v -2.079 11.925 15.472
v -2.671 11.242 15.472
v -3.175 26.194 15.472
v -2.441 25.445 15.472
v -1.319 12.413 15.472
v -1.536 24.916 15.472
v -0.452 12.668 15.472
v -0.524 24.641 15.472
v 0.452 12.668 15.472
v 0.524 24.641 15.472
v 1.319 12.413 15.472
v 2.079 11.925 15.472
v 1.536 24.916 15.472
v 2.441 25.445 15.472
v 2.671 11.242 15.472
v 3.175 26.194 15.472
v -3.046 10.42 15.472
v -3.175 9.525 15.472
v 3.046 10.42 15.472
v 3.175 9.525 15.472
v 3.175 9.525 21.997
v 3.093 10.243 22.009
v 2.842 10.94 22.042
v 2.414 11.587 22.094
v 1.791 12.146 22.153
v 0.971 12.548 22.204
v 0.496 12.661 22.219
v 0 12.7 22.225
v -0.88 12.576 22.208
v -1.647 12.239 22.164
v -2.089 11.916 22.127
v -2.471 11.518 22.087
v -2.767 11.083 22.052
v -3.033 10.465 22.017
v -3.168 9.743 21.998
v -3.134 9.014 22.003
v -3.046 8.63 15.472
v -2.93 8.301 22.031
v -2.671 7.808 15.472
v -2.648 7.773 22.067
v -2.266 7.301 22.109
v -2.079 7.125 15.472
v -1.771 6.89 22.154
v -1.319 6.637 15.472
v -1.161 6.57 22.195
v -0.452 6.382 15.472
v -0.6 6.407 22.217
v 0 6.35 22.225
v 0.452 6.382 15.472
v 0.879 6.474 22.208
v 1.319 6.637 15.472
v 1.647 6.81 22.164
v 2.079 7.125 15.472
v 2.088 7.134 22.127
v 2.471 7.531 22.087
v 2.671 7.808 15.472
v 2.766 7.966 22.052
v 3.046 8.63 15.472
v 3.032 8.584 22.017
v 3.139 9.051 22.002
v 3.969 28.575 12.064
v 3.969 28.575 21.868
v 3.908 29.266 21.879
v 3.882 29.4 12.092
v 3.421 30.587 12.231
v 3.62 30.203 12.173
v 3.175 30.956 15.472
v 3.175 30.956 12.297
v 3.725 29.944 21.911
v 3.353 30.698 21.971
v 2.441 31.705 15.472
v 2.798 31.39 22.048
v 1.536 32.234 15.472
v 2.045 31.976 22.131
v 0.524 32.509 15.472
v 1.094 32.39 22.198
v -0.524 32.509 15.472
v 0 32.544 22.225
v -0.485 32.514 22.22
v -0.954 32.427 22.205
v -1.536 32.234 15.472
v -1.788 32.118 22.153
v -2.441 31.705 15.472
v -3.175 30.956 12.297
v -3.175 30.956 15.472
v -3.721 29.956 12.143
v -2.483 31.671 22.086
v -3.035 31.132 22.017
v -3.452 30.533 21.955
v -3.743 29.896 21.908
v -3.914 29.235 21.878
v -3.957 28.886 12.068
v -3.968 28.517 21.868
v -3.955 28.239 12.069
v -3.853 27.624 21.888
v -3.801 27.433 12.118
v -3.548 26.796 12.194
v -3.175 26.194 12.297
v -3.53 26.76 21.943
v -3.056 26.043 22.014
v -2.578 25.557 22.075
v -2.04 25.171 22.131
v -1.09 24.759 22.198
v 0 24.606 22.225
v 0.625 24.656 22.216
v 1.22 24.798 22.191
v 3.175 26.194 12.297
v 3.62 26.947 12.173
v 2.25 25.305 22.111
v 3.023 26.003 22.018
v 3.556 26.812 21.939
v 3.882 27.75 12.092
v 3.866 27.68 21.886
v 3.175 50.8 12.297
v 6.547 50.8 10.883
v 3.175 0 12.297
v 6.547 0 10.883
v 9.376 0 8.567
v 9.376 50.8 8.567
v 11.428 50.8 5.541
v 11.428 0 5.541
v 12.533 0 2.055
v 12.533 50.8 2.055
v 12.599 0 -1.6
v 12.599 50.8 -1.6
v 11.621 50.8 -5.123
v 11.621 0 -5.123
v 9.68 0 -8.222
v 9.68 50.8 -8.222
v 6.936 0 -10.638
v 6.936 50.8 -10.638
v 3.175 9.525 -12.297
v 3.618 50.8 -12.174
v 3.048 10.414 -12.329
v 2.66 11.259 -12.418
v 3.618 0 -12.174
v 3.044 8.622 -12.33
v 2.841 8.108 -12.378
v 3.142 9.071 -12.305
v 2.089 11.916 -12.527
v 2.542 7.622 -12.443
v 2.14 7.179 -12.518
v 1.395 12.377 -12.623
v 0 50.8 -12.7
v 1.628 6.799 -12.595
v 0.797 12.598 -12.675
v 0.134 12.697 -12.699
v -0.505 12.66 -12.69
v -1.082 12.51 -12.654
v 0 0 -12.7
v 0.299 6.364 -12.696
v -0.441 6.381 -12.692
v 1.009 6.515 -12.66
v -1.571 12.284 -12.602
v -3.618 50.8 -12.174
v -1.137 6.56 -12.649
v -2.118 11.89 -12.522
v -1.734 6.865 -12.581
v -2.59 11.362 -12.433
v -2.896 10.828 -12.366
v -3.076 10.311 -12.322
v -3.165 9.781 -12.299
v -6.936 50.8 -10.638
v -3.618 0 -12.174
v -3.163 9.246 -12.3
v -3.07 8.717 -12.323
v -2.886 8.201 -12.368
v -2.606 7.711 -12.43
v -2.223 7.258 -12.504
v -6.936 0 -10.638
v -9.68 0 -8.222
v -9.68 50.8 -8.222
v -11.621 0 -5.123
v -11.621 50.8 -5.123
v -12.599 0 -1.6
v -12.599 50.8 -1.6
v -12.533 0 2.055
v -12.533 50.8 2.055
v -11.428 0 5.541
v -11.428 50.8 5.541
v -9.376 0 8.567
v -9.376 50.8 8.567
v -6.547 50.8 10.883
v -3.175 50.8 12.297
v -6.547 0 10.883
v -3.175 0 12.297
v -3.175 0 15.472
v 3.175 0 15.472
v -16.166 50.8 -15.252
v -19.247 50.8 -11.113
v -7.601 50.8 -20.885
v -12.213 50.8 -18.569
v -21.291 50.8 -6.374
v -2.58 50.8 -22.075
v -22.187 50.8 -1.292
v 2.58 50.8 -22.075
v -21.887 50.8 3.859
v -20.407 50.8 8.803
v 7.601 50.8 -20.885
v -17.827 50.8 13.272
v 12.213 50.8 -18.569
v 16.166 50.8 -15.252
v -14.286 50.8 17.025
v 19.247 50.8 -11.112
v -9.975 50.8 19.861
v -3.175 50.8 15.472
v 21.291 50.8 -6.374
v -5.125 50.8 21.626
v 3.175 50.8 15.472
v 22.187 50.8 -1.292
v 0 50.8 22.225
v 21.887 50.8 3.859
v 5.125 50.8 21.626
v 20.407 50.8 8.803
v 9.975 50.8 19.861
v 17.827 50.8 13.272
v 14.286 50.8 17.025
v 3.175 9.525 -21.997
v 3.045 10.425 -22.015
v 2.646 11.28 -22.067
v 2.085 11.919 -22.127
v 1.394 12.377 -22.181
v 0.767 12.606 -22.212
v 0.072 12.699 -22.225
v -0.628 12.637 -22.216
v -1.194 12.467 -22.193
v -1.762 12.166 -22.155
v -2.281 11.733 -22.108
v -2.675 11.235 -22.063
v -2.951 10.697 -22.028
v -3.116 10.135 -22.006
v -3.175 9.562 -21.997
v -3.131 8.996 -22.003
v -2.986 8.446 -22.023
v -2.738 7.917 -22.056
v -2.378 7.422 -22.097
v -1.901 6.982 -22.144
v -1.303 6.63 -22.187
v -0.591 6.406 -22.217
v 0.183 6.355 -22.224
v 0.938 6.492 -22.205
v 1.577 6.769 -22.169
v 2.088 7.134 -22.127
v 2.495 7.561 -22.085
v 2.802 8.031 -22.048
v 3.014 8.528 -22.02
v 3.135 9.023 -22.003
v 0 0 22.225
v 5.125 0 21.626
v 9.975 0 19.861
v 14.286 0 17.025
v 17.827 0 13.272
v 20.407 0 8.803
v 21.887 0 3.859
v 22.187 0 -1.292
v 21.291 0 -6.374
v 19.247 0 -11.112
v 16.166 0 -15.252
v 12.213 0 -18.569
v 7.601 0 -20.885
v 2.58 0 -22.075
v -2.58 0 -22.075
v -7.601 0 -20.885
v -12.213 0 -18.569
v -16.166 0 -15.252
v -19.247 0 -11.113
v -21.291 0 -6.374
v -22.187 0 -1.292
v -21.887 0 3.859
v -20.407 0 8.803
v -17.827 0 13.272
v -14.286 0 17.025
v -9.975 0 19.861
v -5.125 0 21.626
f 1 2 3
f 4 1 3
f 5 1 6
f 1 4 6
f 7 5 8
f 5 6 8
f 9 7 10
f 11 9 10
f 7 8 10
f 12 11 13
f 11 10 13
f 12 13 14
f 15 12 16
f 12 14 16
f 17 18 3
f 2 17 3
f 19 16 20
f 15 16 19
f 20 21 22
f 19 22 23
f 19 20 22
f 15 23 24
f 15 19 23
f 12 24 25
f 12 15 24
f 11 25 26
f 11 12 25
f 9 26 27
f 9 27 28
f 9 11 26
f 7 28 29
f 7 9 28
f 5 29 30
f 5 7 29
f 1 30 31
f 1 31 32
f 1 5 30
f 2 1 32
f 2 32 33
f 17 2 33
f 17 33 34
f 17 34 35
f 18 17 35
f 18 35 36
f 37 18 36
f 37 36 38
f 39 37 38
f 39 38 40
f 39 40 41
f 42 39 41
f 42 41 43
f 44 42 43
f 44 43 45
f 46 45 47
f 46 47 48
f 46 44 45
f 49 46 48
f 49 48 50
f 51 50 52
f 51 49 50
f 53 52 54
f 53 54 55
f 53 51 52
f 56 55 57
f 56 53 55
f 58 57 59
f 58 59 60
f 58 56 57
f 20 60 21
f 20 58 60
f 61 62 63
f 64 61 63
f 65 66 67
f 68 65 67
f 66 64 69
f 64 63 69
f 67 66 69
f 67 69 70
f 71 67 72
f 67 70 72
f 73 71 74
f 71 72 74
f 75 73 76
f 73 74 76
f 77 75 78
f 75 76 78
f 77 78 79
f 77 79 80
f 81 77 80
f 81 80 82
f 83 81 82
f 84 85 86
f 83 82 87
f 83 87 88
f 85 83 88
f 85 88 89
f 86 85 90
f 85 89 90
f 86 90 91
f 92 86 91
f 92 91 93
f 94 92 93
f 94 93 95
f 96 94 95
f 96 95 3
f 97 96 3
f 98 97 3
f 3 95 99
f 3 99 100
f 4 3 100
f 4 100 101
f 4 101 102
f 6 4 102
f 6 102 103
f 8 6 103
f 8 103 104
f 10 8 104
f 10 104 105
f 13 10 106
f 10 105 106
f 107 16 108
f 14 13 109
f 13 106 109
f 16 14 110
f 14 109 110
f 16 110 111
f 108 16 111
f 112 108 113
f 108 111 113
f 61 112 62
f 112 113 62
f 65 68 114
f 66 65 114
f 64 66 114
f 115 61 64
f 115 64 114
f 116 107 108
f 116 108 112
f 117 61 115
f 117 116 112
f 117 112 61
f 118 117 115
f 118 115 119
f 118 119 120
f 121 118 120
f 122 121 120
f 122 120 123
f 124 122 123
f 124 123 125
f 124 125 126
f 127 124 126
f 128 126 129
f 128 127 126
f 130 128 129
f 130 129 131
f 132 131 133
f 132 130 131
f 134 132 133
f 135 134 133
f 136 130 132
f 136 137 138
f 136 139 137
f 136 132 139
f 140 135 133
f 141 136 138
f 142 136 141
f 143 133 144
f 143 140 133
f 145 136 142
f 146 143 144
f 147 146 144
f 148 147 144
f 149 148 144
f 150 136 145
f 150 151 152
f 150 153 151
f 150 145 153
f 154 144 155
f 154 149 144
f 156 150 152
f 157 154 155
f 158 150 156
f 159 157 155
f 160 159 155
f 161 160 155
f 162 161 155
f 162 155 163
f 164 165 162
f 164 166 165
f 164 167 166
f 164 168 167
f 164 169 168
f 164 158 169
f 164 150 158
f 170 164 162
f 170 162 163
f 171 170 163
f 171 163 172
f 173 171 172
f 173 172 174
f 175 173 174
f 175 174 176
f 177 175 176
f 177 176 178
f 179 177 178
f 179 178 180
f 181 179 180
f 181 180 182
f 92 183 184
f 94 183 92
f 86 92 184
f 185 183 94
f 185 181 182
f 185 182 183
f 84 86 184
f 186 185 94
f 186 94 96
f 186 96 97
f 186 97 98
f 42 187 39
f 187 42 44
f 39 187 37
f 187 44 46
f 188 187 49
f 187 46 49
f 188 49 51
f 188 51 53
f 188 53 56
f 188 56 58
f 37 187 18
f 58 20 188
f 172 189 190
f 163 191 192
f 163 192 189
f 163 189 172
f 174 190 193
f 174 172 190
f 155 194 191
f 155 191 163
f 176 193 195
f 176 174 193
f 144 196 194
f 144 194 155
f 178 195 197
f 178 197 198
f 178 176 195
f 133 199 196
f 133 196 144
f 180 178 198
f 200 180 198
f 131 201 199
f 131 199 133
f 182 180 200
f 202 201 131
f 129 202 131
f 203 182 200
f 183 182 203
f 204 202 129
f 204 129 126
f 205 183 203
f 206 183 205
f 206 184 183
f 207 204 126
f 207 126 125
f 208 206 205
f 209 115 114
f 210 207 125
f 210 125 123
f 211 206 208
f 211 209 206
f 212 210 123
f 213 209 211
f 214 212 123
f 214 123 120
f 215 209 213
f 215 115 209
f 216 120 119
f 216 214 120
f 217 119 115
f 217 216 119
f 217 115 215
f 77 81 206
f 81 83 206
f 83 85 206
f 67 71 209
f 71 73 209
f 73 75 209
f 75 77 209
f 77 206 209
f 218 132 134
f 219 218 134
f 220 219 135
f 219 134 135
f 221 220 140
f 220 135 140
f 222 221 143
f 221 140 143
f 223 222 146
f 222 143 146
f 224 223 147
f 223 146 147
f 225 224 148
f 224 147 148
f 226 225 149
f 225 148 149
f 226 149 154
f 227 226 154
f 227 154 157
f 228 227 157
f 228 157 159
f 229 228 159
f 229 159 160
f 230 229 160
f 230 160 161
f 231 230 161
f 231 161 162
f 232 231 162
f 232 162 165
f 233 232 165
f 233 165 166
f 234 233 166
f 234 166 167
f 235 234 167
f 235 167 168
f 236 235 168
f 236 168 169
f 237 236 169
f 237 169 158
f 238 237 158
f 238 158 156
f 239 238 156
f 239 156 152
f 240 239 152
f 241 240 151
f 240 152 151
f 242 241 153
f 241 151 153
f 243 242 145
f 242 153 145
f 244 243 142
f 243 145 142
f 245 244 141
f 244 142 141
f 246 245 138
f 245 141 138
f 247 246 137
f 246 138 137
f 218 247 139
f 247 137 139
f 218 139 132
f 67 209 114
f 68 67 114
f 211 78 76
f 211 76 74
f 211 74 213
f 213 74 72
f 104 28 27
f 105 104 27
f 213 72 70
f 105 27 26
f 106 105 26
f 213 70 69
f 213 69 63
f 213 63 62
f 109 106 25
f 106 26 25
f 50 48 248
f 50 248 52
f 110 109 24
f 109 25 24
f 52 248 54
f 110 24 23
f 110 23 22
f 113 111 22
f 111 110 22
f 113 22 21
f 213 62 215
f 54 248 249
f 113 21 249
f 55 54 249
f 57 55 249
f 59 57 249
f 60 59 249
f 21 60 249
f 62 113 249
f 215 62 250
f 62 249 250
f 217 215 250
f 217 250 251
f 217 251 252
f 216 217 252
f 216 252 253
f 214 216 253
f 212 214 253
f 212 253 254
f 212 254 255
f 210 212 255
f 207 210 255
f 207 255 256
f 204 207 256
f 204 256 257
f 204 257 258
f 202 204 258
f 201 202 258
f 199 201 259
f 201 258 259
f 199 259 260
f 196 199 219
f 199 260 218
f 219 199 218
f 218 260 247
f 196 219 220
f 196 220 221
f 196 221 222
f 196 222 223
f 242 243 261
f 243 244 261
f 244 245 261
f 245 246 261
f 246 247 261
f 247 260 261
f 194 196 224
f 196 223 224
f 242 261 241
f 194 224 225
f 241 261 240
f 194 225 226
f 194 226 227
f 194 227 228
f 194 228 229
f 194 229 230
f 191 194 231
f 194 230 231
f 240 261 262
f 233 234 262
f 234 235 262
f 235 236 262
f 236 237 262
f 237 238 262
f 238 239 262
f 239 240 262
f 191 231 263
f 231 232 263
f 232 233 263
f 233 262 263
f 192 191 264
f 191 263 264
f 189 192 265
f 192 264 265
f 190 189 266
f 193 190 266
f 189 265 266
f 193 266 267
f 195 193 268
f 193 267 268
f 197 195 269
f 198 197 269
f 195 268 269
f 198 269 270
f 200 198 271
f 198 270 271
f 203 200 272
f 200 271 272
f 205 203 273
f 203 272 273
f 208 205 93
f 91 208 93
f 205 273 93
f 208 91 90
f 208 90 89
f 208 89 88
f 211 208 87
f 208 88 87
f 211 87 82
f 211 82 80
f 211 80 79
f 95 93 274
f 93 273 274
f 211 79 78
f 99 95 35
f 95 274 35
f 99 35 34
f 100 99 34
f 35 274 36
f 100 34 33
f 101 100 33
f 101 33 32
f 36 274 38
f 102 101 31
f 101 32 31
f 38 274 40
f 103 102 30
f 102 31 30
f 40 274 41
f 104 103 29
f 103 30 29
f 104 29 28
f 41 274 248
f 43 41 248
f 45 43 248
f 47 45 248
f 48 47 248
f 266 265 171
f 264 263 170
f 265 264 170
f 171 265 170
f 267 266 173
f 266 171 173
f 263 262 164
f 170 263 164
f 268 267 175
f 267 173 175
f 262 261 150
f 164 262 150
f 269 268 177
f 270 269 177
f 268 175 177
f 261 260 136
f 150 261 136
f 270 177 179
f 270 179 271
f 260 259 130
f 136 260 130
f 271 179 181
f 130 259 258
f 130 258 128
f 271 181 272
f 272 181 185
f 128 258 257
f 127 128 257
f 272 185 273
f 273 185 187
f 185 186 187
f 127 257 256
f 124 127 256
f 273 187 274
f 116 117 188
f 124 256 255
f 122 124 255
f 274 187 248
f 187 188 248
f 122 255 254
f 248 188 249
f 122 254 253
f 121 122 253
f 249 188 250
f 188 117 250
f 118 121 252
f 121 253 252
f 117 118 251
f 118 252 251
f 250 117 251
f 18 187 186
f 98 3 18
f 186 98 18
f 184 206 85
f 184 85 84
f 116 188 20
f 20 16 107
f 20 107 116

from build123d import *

# Parameters (mm, degrees)
SKETCH1_R                           = 22.225
SKETCH1_R_2                         = 12.7
BOSS_EXTRUDE1_DEPTH                 = 50.8
SKETCH2_R                           = 3.175
CUT_EXTRUDE1_DEPTH                  = 60.737268518
CUT_EXTRUDE1_DEPTH_BACK             = 60.737268518
F_5_16_0_3125_DIAMETER_HOLE1_REACH  = 59.326
F_5_16_0_3125_DIAMETER_HOLE1_BORE_R = 3.96875
CUT_EXTRUDE3_REACH                  = 61.737
SKETCH6_W                           = 6.35
SKETCH6_H                           = 3.175


with BuildPart() as part:
    # Sketch1 → Boss-Extrude1 (new body)
    with BuildSketch(Plane(origin=(0, 0, 0), x_dir=(1, 0, 0), z_dir=(0, 1, 0))):
        with Locations(Location((0, 0, 0), (0, 0, 270))):
            Circle(SKETCH1_R)
        with Locations(Location((0, 0, 0), (0, 0, 270))):
            Circle(SKETCH1_R_2, mode=Mode.SUBTRACT)
    extrude(amount=BOSS_EXTRUDE1_DEPTH)

    # Sketch2 → Cut-Extrude1 (cut, two sides)
    with BuildSketch(Plane.XY) as cut_extrude1_sk:
        with Locations((0, 9.525)):
            Circle(SKETCH2_R)
    extrude(amount=CUT_EXTRUDE1_DEPTH, mode=Mode.SUBTRACT)
    extrude(cut_extrude1_sk.sketch, amount=-CUT_EXTRUDE1_DEPTH_BACK, mode=Mode.SUBTRACT)

    # 5/16 (0.3125) Diameter Hole1 bore (on position points) → 5/16 (0.3125) Diameter Hole1 (cut, up to next)
    with BuildSketch(Plane(origin=(0, 28.575, 22.225), x_dir=(1, 0, 0), z_dir=(0, 0, 1)), mode=Mode.PRIVATE) as f_5_16_0_3125_diameter_hole1_sk1:
        Circle(F_5_16_0_3125_DIAMETER_HOLE1_BORE_R)
    f_5_16_0_3125_diameter_hole1_tool1 = extrude(f_5_16_0_3125_diameter_hole1_sk1.sketch, amount=-F_5_16_0_3125_DIAMETER_HOLE1_REACH, mode=Mode.PRIVATE) & part.part
    add(f_5_16_0_3125_diameter_hole1_tool1.solids().sort_by_distance((0, 28.575, 22.225))[0], mode=Mode.SUBTRACT)

    # Cut-Extrude3: up to this face of the body (flat: up to its plane)
    cut_extrude3_end = Plane(part.part.faces().sort_by_distance((0, 0, -21.596382072))[0])
    # Sketch6 → Cut-Extrude3 (cut, up to the picked face)
    with BuildSketch(Plane(origin=(0, 50.8, 0), x_dir=(1, 0, 0), z_dir=(0, 1, 0)), mode=Mode.PRIVATE) as cut_extrude3_sk1:
        with Locations((0, -13.884222124)):
            Rectangle(SKETCH6_W, SKETCH6_H)
    cut_extrude3_tool1 = split(extrude(cut_extrude3_sk1.sketch, amount=-CUT_EXTRUDE3_REACH, mode=Mode.PRIVATE), bisect_by=cut_extrude3_end, keep=Keep.BOTH, mode=Mode.PRIVATE)
    add(cut_extrude3_tool1.solids().sort_by(Axis((0, 50.8, 13.884222), (0, -1, 0)))[0], mode=Mode.SUBTRACT)


solid = part.part
